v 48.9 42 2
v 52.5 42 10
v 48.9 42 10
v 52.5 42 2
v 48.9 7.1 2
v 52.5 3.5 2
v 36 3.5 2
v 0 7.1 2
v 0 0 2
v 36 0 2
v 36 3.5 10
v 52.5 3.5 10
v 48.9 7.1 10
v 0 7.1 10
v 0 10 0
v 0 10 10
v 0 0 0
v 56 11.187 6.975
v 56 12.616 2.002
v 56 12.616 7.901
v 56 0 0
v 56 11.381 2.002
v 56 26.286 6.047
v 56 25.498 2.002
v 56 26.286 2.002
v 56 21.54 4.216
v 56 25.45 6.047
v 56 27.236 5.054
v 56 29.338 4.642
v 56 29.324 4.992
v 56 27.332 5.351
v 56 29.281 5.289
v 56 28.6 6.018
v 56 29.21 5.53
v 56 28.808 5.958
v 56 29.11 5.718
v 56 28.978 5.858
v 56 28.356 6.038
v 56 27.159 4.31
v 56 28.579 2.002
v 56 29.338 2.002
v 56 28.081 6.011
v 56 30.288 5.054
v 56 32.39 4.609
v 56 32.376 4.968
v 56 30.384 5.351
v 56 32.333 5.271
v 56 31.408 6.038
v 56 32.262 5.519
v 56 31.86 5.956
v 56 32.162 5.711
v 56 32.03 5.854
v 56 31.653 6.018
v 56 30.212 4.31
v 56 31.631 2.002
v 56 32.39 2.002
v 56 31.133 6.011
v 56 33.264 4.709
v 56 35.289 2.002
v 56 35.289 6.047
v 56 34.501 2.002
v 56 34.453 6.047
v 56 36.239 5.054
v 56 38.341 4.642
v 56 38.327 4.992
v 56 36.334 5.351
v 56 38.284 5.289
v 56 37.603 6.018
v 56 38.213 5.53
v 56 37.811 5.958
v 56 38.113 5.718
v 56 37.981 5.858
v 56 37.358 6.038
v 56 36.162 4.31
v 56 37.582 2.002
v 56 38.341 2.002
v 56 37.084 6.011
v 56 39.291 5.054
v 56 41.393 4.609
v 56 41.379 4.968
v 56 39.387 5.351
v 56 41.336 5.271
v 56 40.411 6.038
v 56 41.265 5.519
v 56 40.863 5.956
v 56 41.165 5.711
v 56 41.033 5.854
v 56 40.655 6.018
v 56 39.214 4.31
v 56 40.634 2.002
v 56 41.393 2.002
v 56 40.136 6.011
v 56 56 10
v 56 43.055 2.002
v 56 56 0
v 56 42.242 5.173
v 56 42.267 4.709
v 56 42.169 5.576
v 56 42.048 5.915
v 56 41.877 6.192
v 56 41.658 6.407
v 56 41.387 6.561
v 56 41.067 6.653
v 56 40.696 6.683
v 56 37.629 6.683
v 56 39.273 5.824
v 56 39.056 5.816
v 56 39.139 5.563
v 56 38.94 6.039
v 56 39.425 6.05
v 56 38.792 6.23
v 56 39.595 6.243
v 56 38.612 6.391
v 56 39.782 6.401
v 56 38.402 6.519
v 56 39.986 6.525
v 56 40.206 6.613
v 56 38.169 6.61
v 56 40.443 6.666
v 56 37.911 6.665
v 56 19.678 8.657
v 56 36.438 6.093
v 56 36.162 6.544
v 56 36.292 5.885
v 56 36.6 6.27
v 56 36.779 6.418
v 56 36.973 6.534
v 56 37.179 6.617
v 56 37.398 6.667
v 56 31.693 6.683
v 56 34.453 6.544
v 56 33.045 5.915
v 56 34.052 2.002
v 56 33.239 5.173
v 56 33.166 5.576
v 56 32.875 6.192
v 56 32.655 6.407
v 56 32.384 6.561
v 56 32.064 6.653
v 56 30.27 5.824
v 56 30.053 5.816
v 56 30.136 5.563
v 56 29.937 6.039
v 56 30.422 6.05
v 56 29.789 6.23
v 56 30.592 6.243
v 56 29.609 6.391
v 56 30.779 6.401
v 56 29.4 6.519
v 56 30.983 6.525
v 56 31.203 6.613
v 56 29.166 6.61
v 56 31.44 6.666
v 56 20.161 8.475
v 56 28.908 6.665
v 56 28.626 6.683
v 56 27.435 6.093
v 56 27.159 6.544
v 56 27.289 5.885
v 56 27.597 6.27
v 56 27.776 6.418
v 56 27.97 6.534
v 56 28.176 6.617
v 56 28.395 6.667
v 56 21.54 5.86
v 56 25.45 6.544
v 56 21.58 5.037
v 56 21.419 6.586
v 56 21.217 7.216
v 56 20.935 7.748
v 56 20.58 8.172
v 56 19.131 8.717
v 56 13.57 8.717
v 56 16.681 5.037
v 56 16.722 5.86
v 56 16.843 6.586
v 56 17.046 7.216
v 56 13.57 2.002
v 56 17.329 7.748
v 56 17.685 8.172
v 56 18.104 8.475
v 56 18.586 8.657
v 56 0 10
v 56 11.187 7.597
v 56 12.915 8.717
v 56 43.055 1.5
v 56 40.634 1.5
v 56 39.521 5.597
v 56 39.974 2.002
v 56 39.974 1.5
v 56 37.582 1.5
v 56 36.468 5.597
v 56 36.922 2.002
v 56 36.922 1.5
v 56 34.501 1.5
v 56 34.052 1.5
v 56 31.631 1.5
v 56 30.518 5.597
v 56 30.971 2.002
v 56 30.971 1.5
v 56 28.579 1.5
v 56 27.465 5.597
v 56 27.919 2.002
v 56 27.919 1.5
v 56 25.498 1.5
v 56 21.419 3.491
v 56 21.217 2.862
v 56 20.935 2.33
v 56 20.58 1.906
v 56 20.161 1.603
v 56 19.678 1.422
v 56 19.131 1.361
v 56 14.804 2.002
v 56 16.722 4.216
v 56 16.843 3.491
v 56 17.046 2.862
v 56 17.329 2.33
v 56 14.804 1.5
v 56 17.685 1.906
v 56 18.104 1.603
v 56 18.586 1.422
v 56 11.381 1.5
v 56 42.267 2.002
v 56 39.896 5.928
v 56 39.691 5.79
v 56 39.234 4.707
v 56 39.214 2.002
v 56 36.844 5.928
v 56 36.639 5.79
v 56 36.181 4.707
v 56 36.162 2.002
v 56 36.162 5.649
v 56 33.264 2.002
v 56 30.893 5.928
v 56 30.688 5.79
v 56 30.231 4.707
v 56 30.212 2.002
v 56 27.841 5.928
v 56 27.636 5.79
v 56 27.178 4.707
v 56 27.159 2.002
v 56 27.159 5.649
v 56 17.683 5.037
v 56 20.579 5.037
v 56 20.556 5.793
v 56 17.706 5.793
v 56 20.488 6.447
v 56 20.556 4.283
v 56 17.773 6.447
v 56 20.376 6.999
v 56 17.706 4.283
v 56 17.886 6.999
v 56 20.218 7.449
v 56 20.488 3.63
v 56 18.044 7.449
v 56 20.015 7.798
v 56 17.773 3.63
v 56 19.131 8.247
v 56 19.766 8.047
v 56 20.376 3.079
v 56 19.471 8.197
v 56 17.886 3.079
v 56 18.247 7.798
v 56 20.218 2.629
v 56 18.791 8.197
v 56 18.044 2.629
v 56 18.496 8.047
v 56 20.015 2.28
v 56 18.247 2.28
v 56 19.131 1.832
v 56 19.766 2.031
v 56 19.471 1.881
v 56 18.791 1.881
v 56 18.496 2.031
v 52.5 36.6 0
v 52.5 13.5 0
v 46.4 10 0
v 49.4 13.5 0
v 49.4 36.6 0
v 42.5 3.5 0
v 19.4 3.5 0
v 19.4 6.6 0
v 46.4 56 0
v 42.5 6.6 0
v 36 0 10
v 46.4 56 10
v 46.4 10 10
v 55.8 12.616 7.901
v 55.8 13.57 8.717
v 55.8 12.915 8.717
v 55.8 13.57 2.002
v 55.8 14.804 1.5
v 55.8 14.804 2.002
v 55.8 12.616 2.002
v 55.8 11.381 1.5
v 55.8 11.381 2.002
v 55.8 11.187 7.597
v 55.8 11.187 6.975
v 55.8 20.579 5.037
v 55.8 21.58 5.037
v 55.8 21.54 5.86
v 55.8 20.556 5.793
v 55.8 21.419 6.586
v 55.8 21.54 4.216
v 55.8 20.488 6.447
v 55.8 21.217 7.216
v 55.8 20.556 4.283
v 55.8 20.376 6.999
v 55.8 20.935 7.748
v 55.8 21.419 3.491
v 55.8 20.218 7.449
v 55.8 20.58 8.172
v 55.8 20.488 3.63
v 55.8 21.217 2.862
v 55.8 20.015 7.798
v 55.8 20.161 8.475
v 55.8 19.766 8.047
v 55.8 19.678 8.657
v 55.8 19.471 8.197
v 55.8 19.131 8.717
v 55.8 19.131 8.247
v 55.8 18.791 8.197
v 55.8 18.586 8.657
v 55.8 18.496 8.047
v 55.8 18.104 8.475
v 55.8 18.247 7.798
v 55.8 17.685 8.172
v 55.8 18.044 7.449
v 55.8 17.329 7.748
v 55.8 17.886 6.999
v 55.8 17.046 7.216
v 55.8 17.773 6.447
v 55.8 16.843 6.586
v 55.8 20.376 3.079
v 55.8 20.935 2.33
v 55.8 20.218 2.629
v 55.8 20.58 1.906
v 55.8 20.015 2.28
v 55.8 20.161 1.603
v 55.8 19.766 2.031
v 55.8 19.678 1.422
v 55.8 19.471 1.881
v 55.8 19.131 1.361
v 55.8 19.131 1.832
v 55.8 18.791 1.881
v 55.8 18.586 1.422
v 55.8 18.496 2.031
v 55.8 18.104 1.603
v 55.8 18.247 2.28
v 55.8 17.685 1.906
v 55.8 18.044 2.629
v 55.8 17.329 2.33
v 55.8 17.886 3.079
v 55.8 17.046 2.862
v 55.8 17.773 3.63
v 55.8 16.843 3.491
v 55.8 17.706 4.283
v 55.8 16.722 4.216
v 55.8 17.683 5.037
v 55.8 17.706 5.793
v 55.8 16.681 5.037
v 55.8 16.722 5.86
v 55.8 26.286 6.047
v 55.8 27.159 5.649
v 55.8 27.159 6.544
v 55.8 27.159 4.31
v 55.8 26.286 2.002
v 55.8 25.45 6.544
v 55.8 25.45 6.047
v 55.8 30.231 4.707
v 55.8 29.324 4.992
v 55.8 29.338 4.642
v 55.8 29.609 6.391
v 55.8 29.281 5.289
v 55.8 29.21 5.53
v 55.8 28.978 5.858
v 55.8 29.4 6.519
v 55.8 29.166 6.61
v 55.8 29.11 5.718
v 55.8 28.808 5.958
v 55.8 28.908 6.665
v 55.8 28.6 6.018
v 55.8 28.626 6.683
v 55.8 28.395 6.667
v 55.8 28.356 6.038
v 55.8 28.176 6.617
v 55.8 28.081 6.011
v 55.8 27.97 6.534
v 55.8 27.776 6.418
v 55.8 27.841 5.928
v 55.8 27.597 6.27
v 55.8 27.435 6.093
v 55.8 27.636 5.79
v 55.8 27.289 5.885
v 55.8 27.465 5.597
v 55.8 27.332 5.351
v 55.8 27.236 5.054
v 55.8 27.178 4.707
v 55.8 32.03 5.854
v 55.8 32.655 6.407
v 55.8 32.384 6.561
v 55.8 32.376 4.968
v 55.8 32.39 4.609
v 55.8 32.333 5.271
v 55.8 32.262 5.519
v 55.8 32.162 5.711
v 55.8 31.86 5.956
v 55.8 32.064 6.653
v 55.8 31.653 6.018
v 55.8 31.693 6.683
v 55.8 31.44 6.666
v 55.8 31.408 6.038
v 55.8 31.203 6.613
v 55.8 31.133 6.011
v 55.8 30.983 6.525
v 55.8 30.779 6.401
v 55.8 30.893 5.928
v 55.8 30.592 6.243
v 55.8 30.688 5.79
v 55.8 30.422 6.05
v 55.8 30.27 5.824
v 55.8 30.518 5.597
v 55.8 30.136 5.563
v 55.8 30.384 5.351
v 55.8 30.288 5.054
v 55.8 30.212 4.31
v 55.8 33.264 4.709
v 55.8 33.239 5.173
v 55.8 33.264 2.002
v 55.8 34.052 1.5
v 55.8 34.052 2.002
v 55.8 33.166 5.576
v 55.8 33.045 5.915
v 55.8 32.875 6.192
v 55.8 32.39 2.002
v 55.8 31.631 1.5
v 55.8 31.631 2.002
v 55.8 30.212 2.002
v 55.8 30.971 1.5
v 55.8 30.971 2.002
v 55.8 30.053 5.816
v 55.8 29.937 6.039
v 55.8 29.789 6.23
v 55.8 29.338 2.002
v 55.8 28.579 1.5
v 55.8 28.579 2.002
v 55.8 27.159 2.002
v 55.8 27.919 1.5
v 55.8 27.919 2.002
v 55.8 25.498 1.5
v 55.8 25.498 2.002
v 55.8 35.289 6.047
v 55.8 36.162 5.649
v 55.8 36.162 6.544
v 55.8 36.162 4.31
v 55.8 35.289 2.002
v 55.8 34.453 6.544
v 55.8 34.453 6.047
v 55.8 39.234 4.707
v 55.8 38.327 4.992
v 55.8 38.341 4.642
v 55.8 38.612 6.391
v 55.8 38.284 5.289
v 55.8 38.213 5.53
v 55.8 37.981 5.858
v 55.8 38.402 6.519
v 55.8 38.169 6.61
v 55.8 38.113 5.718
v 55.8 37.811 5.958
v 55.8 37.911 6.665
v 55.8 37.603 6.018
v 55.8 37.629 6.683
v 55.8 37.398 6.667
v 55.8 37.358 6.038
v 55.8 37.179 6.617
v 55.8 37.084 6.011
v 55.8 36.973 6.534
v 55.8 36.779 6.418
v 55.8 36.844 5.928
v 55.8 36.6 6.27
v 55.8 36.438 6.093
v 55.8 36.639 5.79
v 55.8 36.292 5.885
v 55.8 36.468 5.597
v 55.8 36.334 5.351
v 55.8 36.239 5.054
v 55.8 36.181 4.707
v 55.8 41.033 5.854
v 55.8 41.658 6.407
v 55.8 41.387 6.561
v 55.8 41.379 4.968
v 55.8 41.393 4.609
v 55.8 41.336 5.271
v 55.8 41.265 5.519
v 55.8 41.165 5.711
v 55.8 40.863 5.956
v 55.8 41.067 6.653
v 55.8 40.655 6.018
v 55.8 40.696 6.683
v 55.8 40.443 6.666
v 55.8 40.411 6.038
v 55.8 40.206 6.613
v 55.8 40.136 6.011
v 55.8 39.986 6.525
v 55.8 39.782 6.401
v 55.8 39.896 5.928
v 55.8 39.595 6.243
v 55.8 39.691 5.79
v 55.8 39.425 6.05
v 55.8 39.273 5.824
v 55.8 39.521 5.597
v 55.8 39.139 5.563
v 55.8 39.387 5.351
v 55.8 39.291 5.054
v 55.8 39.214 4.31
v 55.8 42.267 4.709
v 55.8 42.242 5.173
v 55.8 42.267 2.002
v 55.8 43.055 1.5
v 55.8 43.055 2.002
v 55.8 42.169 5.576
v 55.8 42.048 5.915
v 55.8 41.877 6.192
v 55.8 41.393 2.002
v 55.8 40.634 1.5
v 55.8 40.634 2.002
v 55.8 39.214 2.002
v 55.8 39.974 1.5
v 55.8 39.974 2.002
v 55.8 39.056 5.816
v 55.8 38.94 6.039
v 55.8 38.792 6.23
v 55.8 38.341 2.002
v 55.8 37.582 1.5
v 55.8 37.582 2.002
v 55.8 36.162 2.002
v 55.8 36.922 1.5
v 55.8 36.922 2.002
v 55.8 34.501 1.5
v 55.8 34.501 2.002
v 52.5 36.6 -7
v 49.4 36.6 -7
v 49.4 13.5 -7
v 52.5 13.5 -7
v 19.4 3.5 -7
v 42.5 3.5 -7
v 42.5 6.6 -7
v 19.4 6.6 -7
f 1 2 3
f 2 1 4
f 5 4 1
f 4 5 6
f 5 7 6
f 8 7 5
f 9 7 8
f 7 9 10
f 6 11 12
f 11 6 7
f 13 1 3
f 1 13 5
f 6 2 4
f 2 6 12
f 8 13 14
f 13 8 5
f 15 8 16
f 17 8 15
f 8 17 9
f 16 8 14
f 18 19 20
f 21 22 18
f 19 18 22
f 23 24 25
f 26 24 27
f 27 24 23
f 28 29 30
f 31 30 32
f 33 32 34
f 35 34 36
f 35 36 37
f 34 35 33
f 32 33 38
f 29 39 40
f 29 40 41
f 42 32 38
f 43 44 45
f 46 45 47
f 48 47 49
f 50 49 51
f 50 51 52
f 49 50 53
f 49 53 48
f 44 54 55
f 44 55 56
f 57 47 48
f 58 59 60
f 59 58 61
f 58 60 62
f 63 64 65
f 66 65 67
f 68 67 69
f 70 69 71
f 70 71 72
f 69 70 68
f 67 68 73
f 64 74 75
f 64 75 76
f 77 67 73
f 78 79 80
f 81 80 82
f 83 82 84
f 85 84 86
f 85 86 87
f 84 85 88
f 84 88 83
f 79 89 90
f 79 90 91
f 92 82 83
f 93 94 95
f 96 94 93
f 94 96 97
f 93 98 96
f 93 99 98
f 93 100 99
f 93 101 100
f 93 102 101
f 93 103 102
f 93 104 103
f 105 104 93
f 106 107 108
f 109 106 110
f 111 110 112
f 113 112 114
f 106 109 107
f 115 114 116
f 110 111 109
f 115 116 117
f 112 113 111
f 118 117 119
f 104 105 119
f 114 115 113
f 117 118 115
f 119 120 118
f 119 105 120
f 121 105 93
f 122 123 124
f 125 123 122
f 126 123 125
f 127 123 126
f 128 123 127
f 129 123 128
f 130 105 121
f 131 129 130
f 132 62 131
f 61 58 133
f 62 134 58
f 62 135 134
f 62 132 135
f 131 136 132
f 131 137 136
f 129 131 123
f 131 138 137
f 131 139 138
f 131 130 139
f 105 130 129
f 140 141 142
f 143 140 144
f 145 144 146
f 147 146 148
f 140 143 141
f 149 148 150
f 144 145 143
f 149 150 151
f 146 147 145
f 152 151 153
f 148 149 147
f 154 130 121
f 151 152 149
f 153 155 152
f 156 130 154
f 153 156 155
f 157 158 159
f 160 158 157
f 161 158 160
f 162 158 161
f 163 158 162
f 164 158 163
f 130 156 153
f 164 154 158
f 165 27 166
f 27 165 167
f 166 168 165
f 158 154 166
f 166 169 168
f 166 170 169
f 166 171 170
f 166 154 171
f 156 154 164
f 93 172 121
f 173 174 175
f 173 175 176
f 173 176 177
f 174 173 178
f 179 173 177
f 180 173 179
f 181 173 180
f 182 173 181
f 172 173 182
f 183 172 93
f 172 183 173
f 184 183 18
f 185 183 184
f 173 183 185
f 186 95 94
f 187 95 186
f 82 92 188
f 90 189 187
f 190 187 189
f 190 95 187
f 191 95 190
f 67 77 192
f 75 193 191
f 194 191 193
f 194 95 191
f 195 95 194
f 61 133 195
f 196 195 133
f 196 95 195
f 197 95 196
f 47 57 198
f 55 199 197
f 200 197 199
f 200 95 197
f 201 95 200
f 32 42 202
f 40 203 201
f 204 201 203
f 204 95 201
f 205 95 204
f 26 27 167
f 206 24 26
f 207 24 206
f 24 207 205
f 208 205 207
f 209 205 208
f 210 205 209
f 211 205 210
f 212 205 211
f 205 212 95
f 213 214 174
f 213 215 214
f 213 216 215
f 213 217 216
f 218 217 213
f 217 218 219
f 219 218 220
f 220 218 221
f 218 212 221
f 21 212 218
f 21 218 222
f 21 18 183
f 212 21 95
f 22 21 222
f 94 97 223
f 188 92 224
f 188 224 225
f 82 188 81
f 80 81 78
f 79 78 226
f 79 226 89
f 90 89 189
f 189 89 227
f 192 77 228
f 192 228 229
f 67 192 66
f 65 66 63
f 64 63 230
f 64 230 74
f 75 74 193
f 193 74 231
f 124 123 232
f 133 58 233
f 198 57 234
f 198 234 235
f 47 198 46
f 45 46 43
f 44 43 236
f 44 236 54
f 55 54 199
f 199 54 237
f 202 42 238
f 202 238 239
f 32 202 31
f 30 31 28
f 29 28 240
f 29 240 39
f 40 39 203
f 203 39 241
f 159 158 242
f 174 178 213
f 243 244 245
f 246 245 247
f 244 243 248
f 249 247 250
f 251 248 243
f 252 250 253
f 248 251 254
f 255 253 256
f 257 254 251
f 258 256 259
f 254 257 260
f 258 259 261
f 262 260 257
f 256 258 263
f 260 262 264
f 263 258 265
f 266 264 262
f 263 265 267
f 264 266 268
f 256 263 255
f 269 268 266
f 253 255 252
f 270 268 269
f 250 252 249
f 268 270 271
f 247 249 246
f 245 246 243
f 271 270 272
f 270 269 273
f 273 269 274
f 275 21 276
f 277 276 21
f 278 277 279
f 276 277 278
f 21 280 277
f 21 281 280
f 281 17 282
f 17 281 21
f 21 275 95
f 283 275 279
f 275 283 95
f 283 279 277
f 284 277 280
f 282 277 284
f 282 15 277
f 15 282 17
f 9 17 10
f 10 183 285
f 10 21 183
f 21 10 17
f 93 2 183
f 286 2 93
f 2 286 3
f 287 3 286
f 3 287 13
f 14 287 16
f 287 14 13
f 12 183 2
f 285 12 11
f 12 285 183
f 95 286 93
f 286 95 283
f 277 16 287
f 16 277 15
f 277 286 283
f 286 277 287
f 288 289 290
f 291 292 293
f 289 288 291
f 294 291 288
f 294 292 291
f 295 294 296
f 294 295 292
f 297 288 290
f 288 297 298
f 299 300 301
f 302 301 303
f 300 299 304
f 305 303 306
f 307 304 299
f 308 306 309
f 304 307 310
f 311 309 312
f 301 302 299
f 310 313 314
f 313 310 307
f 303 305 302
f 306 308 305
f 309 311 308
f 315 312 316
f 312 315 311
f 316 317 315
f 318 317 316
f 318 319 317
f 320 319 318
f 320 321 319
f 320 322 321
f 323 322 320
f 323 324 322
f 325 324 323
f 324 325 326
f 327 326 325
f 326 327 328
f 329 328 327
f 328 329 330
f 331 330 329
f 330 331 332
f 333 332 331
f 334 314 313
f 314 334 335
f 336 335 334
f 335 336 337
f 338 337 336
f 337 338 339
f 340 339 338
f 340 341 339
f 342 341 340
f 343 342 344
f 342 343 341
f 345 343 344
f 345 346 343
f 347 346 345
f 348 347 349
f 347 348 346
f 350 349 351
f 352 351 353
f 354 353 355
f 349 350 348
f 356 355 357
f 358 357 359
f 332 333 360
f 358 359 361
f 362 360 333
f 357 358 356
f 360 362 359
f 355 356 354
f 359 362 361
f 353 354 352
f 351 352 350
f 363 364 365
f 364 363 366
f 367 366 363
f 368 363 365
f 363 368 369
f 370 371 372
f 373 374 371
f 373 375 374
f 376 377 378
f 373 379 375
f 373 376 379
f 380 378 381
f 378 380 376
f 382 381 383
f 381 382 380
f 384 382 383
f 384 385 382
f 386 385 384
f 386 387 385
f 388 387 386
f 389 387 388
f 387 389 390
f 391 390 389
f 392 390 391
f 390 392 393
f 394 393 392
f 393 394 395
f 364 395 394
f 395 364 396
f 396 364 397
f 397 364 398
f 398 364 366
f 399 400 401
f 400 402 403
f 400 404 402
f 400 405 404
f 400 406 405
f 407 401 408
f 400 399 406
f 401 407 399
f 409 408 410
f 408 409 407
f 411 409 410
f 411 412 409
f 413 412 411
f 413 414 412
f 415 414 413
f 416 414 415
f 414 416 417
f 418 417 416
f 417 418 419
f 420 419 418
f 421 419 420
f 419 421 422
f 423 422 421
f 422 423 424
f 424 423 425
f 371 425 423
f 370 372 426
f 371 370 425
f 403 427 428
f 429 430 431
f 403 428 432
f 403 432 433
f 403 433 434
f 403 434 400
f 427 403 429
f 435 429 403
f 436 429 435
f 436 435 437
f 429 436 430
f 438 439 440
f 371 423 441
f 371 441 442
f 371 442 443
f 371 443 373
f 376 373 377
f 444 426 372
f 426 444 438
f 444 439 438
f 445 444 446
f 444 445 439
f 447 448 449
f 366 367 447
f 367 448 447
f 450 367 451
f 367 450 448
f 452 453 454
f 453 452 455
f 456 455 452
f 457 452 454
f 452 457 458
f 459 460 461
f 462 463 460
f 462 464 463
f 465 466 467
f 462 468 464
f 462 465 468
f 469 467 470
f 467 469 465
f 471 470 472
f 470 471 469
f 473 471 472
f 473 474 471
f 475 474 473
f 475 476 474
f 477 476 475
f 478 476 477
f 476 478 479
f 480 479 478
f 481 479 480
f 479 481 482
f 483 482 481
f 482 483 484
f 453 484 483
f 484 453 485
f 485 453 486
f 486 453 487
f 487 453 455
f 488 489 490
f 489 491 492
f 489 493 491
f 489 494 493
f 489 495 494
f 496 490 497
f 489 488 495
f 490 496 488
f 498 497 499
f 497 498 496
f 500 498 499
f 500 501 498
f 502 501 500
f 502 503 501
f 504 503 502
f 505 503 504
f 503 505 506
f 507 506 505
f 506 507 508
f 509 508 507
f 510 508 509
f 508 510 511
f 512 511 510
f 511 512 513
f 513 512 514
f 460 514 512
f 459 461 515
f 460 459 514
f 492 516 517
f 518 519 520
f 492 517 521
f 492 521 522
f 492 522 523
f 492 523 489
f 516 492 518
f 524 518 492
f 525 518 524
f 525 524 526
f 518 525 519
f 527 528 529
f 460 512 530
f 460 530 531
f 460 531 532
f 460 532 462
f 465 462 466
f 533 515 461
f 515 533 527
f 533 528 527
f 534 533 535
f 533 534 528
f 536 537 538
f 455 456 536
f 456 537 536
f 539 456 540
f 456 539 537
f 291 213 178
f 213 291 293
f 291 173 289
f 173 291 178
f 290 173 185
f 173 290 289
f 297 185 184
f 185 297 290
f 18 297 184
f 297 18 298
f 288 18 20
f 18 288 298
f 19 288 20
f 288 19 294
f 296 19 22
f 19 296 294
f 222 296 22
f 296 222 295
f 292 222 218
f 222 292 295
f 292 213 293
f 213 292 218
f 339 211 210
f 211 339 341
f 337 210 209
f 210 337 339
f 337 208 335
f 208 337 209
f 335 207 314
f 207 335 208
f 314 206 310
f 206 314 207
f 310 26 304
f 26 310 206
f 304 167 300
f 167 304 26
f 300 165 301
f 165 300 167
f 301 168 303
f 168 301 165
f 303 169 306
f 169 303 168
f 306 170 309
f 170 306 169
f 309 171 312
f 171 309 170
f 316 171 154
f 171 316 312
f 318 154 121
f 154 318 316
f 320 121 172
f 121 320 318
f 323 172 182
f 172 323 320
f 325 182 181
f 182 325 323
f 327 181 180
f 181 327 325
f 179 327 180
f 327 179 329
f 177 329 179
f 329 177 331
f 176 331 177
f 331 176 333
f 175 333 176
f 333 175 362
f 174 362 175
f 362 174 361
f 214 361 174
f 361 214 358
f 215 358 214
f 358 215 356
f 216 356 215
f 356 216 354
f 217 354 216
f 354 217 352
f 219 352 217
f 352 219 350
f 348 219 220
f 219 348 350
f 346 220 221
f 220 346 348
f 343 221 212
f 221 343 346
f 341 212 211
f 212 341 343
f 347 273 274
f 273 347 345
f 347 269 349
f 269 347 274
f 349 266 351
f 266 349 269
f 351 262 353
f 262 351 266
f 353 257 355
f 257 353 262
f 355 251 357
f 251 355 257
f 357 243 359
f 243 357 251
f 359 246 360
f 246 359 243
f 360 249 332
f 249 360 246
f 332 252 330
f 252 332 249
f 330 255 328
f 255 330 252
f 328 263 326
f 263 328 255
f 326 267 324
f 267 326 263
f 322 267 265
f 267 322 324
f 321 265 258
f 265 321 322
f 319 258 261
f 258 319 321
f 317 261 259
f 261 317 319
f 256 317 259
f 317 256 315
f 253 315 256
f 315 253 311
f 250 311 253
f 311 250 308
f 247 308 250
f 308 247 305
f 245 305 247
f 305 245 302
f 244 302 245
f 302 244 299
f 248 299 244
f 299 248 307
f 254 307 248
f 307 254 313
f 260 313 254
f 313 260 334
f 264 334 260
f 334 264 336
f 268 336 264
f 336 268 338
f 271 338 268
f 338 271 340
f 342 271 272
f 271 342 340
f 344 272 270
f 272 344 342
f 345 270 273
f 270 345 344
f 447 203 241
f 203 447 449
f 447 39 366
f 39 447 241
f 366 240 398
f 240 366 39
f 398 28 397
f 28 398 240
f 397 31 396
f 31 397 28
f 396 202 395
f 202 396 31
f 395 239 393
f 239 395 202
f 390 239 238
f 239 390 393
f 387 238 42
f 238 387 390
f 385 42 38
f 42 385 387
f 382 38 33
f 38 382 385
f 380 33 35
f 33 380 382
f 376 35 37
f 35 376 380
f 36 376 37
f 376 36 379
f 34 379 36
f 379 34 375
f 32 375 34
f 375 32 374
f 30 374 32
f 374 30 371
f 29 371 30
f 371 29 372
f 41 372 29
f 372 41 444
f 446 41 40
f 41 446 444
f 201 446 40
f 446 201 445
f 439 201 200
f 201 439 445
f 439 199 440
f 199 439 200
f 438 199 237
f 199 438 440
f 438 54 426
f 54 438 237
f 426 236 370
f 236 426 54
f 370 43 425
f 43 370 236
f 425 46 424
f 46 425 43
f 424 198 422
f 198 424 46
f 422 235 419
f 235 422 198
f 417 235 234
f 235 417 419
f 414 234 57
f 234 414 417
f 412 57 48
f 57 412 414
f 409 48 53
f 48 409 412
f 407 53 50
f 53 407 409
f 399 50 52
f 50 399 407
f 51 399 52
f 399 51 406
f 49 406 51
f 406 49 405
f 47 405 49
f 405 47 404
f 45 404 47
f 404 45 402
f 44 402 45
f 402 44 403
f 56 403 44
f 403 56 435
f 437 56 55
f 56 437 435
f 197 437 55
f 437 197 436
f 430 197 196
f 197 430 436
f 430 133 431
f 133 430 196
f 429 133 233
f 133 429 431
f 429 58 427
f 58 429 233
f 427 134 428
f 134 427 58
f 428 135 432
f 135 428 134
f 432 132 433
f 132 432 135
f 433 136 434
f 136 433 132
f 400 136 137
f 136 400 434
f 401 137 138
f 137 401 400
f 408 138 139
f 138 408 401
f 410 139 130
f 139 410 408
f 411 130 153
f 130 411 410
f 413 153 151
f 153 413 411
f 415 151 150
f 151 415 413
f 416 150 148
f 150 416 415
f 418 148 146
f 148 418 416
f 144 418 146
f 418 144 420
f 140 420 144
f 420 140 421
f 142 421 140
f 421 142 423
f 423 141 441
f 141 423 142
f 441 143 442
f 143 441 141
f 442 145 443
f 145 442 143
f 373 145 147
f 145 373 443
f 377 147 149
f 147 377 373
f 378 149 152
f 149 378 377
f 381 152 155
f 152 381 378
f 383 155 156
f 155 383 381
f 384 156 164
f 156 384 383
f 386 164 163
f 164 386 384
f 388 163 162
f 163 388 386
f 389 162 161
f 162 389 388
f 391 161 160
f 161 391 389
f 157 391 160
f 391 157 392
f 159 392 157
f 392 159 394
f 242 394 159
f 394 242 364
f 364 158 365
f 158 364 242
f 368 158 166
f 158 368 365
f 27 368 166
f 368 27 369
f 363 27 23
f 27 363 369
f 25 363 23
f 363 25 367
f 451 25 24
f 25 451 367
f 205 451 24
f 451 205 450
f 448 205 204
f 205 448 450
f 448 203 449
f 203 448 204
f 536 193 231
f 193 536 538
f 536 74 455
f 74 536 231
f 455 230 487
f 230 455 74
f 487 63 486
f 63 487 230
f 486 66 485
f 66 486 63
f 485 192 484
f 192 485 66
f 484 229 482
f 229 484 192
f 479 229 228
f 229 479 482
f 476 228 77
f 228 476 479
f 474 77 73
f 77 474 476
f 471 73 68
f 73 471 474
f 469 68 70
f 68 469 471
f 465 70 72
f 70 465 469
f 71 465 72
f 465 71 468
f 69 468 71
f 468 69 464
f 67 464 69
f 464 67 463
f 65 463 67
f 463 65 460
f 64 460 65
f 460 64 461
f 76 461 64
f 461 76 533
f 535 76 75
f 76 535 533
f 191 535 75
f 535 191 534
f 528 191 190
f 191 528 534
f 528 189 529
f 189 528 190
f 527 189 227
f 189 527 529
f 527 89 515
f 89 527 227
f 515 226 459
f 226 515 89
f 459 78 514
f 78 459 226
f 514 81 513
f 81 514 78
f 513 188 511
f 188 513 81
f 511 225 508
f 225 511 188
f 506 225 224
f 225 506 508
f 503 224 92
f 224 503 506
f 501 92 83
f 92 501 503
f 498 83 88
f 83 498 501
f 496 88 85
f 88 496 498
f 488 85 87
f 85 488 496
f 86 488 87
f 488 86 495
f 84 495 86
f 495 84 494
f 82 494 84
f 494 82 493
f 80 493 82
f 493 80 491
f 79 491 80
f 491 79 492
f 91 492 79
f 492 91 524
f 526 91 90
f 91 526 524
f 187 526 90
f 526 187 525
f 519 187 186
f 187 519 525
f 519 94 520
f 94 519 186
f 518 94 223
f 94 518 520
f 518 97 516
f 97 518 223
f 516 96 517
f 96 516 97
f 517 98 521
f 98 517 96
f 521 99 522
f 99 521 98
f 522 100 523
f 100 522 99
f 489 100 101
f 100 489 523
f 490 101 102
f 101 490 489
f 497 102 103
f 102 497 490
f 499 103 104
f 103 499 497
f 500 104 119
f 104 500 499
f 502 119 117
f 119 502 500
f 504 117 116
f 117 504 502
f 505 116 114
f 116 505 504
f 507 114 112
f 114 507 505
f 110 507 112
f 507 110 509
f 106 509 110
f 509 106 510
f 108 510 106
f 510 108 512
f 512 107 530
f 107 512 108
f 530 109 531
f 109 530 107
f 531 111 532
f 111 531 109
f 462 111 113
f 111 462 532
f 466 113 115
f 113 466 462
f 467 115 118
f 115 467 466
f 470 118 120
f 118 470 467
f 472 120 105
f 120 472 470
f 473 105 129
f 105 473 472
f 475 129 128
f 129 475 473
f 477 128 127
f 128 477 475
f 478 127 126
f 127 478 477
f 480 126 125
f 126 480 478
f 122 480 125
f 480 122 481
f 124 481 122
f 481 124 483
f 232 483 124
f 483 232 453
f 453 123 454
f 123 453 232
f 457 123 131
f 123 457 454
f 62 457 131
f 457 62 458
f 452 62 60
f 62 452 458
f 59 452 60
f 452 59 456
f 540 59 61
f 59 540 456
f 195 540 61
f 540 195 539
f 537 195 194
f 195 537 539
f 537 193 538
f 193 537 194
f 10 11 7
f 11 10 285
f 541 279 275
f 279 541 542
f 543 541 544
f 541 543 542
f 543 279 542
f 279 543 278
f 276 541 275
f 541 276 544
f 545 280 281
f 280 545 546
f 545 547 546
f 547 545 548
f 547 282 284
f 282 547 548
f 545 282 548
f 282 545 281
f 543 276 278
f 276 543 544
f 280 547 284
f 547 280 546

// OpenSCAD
// file: height extender - base.scad
$fn = 30;

use <./height extender - base.scad>;
extender(10);
module extender(h) {
    difference() {
        union() {
            linear_extrude(height = h)
            color("grey")
            translate([0, 0, 0])
            base();
        }

        translate([56 - 3.5, 3.5, 2])
        rotate([0, 0, 90])
        recess();

        color("pink")
        translate([-1, 10, 2])
        linear_extrude(height = 10)
        cutout();

        translate([17, 17, -1])
        cylinder(h = 4, r = 2);

        translate([40, 40, -1])
        cylinder(h = 4, r = 2);
    }

    translate([17,17,2])
    screw_hole();

    translate([40,40,2])
    screw_hole();
}

module base() {
    polygon(points=[
                [0, 0],
                [56, 0],
                [56, 56],
                [46, 56],
                [0, 10],
                [0,0]
                ],convexity=10
        );
};

module cutout() {
    polygon(points=[
                [0, 0],
                [47, 0],
                [47, 47],
                [0,0]
                ],convexity=10
        );
};

module recess() {

    w = 38.5;
    t = 3.6;
    h = 10;

    color("red")
    cube([w, t, h]);

    color("pink")
    translate([t, 0, 0])
    rotate([0, 0, 90])
    cube([w, t, h]);
};

module screw_hole() {
    
    difference() {
        cylinder(h = 3, r = 5);
            
        color("red")
        union() {
            translate([0, 0, 1.1])
            cylinder(h = 2, r1 = 2, r2 = 4);
            translate([0, 0, -1])
            cylinder(h = 5, r = 2);
        }   
    }
}
// main file
$fn = 30;

use <height extender - base.scad>;

// w = 38.5;
// t = 3.6;
// h = 10;

difference() {
    w = 30;
    t = 3.1;
    h = 7.5;
    extender(10);

    color("red")
    translate([-3.6, 10, -1])
    cube([50,50,13]);

    font = ("Elephant");
    // color("cyan")
    // translate([10, 0.2, 1.5])
    // rotate([90, 0, 0])
    // linear_extrude(2)
    // text(text = "10 mm", font = font, size = 7);

    color("cyan")
    translate([55.8, 10, 1.5])
    rotate([90, 0, 90])
    linear_extrude(2)
    text(text = "10 mm", font = font, size = 7);


    //////////////////////////////////////////////////
    // 
    color("green")
    translate([-1, t+0.9, 2])
    rotate([0, 0, 0])
    cube([w, t, h+2]);

    color("red")
    translate([-1, -1, 2])
    cube([37, t+3, 10]);
    //
    //////////////////////////////////////////////////
}


//color("green")
translate([56 - 3.5, 3.5, -9])
rotate([0, 0, 90])
recess();


module recess(s) {

    w = 30;
    t = 3.1;
    h = 7.5;

    difference() {

        union() {   
            color("red")
            translate([t, 0, 2])
            cube([w, t, h]);

            color("pink")
            translate([t, t, 2])
            rotate([0, 0, 90])
            cube([w, t, h]);
        }

        color("blue")
        translate([10, -10, 1])
        rotate([0, 0, 90])
        cube([20, 20, 10]);



    }

};
